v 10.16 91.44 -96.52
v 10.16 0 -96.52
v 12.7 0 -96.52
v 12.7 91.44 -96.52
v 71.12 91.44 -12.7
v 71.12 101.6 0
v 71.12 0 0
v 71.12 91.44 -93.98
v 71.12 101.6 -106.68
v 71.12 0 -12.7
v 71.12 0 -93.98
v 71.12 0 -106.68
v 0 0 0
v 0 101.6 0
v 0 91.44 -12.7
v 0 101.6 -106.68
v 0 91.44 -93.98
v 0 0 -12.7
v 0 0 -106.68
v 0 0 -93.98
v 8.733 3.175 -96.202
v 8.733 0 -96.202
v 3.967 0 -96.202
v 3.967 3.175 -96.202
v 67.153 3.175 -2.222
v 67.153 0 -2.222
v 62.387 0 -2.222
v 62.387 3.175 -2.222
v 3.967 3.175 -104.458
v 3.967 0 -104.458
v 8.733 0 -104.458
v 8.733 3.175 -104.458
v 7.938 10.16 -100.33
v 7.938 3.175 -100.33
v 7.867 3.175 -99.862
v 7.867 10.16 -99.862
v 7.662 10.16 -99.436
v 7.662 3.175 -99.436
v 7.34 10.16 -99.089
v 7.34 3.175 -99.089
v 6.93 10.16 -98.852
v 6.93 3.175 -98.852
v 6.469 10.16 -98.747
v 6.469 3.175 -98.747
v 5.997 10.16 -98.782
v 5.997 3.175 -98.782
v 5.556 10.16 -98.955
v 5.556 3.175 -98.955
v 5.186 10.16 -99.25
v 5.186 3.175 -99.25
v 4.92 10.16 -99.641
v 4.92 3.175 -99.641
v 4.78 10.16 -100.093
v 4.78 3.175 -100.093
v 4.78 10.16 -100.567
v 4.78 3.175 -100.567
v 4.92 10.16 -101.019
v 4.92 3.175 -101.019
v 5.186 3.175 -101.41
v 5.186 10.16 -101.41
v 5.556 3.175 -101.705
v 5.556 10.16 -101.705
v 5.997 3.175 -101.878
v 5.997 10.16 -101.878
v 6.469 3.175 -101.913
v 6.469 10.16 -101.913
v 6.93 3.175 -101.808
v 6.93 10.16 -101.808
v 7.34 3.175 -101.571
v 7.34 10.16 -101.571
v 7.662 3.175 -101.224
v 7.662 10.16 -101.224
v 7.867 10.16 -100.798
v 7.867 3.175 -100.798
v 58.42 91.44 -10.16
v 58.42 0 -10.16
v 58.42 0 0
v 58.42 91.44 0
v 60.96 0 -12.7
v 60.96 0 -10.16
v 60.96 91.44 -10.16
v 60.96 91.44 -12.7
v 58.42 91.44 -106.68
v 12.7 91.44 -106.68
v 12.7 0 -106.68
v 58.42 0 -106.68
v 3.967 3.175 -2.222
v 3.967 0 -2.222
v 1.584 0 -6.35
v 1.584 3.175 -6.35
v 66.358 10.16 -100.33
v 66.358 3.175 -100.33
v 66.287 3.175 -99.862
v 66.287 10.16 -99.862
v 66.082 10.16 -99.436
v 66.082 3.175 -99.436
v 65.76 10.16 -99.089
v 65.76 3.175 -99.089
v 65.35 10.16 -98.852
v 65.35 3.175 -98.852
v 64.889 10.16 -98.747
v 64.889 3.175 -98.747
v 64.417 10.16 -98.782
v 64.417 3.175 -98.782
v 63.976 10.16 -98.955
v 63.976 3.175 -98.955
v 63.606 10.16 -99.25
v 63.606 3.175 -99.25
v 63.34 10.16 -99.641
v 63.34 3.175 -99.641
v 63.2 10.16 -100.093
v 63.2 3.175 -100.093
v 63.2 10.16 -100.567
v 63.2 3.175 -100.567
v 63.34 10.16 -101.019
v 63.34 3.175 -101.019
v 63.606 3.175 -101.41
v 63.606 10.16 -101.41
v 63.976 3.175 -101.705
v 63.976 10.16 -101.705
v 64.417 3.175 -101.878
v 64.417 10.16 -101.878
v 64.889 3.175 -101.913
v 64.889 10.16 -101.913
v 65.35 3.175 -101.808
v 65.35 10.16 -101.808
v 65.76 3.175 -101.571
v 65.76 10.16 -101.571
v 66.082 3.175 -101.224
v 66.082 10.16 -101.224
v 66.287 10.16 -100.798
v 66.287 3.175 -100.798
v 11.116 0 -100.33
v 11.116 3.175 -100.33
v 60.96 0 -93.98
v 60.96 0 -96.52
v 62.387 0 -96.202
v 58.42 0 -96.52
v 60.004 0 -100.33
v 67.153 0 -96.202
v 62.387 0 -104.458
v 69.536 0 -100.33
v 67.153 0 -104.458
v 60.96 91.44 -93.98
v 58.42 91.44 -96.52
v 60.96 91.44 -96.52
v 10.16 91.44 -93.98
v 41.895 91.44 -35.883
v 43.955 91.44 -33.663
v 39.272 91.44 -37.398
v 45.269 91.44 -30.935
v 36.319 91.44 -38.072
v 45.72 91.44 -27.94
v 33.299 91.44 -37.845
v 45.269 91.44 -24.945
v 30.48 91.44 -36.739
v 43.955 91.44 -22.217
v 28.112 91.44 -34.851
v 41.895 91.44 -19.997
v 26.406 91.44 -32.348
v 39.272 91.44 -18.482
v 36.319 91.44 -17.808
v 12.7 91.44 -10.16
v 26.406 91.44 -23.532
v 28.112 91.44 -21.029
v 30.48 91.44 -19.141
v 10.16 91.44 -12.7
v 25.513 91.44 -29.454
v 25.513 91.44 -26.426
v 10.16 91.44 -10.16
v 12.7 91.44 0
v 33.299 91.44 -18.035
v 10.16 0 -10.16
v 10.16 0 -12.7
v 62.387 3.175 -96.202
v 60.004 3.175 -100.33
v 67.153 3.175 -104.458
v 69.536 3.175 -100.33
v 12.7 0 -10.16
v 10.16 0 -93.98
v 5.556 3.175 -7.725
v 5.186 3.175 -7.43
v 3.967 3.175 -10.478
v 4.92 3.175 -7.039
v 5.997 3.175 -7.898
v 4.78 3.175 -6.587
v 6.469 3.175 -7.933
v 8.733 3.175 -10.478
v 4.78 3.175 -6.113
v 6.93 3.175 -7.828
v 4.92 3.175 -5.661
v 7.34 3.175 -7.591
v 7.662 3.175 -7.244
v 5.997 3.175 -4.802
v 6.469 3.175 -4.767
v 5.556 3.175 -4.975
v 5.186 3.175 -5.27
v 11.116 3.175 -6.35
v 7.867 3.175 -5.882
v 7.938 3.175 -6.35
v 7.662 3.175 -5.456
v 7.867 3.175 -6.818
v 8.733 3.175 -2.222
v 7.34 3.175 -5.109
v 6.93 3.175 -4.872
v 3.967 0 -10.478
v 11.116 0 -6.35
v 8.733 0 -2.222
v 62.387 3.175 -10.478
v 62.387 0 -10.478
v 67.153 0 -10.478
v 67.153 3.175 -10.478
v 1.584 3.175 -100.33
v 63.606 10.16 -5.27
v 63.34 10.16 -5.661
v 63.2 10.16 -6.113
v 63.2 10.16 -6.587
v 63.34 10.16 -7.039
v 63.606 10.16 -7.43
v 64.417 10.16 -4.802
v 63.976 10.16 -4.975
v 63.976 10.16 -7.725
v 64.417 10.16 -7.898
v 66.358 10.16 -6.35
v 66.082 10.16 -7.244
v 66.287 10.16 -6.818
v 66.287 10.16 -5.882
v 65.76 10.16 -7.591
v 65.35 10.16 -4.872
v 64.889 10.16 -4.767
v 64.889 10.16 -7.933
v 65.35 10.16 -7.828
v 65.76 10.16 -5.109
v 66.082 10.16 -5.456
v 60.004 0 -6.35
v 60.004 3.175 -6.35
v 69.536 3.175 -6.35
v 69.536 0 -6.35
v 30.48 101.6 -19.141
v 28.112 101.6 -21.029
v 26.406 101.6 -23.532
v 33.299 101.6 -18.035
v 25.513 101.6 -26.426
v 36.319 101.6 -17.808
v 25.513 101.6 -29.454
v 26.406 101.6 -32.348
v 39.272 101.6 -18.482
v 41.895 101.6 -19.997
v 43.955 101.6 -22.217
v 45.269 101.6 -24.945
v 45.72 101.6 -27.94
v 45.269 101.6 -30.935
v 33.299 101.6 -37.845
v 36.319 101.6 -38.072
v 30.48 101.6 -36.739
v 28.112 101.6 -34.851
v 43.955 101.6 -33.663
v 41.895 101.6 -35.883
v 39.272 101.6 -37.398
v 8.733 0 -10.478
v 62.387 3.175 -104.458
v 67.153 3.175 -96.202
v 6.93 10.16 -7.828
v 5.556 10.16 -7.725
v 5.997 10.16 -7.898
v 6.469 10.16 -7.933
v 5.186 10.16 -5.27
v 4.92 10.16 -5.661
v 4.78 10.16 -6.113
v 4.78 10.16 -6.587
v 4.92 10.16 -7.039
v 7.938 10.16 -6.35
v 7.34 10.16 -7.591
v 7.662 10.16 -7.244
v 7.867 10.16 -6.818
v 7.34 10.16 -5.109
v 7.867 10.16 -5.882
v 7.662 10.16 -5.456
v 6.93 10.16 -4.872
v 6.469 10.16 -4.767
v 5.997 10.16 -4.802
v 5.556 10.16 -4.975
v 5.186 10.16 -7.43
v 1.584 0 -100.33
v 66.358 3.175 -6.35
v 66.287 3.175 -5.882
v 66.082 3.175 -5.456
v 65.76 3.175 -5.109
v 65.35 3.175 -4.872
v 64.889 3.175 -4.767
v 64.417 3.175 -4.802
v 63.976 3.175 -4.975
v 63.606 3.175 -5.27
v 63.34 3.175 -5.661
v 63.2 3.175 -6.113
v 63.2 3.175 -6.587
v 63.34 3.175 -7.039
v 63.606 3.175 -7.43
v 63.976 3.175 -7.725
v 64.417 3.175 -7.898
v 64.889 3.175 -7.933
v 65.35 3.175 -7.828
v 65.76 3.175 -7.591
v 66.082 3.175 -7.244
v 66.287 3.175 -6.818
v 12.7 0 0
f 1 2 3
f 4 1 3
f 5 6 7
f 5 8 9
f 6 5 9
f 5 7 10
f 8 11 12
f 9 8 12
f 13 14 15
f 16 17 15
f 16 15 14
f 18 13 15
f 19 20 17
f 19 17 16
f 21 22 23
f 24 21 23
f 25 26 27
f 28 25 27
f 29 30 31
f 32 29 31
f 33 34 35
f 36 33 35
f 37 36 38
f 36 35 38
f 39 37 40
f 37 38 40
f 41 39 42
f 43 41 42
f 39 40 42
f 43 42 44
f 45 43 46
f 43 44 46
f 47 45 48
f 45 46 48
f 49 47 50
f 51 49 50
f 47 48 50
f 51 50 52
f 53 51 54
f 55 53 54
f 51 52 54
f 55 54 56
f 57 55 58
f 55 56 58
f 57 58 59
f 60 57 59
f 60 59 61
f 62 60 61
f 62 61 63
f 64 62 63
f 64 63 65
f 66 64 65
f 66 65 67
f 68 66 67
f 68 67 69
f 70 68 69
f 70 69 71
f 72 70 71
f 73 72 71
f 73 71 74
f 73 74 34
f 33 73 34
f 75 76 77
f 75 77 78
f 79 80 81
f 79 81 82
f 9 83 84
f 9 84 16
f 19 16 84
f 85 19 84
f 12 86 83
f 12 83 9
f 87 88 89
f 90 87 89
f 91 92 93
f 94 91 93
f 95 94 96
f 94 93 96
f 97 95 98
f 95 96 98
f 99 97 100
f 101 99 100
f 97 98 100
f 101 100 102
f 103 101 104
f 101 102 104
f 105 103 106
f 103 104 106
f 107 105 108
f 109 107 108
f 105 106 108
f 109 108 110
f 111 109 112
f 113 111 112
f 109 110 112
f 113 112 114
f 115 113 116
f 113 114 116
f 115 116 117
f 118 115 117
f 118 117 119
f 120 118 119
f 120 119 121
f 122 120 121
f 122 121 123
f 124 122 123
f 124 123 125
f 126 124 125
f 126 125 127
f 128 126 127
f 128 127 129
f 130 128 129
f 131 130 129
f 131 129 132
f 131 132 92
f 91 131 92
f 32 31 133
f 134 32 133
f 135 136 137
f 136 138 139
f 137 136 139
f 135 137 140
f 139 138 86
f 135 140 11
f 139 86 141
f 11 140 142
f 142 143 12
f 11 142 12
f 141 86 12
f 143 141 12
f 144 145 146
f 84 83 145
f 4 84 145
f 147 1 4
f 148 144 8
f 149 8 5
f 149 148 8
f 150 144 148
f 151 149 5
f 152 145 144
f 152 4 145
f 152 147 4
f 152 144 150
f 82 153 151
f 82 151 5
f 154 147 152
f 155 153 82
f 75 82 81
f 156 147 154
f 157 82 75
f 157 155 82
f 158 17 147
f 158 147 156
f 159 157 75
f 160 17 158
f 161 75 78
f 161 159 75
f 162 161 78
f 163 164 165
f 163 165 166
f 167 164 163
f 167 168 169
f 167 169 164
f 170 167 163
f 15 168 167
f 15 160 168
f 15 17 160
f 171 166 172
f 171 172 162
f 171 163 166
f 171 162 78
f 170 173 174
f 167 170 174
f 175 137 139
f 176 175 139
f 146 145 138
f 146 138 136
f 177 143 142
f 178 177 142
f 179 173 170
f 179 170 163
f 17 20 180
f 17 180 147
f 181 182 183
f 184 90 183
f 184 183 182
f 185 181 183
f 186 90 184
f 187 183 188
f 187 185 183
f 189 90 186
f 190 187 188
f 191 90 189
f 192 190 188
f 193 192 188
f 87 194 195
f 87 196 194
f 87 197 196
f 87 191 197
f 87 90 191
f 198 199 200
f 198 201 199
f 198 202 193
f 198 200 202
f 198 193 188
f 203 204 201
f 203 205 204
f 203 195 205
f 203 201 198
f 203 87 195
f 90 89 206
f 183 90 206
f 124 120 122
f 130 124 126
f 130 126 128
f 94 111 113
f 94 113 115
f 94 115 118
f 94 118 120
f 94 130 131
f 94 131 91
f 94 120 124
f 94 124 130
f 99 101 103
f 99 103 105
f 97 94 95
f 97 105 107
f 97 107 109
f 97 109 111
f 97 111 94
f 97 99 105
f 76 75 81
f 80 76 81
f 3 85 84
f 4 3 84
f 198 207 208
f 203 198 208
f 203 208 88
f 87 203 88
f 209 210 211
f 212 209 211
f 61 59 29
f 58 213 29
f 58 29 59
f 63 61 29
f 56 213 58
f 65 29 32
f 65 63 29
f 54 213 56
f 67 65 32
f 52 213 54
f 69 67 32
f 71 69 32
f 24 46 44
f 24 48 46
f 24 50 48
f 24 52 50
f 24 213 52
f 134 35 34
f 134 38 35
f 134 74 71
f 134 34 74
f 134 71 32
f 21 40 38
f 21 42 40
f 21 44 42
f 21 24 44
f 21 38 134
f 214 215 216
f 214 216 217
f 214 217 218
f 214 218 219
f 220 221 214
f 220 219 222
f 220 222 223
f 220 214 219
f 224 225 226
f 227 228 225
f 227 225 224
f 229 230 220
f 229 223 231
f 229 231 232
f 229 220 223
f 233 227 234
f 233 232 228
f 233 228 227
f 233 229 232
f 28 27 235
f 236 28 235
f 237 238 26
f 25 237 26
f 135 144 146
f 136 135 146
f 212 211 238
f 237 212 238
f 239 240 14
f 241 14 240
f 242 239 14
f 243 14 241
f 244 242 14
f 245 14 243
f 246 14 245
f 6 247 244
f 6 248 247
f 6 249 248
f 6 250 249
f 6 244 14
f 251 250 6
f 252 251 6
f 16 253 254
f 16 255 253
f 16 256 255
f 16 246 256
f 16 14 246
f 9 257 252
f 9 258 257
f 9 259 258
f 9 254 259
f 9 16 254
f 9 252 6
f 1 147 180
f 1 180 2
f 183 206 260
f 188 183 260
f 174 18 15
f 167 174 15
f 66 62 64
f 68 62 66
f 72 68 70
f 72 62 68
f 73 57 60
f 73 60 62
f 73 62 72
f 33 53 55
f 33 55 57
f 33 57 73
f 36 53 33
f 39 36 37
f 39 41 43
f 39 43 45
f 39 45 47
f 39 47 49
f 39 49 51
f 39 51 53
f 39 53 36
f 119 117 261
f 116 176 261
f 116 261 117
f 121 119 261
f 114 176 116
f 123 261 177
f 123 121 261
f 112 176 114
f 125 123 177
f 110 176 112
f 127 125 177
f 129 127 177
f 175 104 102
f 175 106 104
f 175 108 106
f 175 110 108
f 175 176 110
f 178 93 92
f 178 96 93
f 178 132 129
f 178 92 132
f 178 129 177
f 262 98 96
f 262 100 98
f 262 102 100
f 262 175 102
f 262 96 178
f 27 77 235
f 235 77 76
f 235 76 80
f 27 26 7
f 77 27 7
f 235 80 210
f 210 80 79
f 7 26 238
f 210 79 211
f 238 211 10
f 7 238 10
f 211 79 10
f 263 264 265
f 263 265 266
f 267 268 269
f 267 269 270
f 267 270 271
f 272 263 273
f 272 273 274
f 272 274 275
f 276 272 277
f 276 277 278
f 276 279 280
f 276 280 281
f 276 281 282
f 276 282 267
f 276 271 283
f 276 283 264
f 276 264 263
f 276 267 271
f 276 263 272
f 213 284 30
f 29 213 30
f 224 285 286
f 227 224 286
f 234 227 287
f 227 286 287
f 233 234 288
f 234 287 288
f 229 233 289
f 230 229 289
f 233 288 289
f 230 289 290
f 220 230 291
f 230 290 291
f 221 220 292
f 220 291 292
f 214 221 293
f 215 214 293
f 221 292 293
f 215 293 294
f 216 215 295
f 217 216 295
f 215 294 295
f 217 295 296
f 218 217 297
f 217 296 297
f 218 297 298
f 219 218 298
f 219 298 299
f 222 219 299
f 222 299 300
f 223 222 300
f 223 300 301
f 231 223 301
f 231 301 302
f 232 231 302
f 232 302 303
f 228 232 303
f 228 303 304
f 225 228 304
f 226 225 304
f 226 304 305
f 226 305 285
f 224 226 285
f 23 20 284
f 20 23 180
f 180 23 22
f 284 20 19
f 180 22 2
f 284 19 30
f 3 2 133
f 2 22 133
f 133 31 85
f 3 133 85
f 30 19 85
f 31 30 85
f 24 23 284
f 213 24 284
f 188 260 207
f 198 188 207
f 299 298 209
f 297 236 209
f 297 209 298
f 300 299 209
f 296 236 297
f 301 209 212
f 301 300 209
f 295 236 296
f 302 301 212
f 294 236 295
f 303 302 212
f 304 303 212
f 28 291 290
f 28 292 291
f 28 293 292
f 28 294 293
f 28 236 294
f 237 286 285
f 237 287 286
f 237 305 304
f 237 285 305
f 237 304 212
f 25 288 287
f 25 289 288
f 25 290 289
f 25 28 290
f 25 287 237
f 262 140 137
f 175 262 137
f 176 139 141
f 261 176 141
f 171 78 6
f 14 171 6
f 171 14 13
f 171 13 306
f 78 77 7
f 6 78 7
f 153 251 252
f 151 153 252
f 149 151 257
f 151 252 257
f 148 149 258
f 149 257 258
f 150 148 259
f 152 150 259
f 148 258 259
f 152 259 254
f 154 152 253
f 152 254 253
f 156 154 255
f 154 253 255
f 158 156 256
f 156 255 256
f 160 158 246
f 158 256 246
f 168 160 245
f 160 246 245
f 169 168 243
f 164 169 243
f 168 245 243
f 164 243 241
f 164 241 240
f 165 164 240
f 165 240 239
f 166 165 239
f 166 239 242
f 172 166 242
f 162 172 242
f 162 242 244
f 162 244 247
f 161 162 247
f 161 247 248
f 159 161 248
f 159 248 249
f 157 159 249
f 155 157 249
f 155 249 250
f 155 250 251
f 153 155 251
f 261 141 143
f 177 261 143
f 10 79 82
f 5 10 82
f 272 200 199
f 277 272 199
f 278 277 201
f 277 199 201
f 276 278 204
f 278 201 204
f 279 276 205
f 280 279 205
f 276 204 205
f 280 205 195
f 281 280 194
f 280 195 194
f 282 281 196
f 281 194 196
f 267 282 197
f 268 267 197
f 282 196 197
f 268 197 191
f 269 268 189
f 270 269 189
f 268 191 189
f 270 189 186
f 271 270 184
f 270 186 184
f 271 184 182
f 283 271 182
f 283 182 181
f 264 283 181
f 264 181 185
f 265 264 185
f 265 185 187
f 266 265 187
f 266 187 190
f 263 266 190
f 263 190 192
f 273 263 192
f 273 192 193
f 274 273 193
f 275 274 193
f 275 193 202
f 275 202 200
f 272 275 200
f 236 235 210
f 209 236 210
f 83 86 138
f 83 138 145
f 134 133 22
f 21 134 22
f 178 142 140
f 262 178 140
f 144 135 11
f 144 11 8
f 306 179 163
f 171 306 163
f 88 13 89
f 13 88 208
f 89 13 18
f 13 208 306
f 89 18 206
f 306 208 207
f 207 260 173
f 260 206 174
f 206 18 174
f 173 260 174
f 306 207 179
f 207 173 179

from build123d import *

# Parameters (mm, degrees)
SKETCH1_W               = 71.12
SKETCH1_H               = 106.68
BOSS_EXTRUDE1_DEPTH     = 101.6
SHELL1_T                = -10.16
SKETCH3_R               = 1.5875
CUT_EXTRUDE1_DEPTH      = 10.16
SKETCH4_W               = 81.28
SKETCH4_H               = 91.44
CUT_EXTRUDE2_DEPTH      = 72.12
CUT_EXTRUDE3_DEPTH      = 3.175
SKETCH7_W               = 45.72
SKETCH7_H               = 91.44
CUT_EXTRUDE4_DEPTH      = 1
CUT_EXTRUDE4_DEPTH_BACK = 107.68
CUT_EXTRUDE5_REACH      = 103.6
SKETCH8_R               = 10.16


with BuildPart() as part:
    # Sketch1 → Boss-Extrude1 (new body)
    with BuildSketch(Plane(origin=(0, 0, 0), x_dir=(1, 0, 0), z_dir=(0, 1, 0))):
        with Locations((35.56, 53.34)):
            Rectangle(SKETCH1_W, SKETCH1_H)
    extrude(amount=BOSS_EXTRUDE1_DEPTH)

    # Shell1
    shell1_openings = [part.faces().sort_by_distance(p)[0] for p in [
        (35.56, 0, -53.34),
    ]]
    offset(amount=SHELL1_T, openings=shell1_openings, kind=Kind.INTERSECTION)

    # Sketch3 → Cut-Extrude1 (cut)
    with BuildSketch(Plane.XZ):
        with Locations((6.35, -6.35)):
            Circle(SKETCH3_R)
        with Locations((64.77, -6.35)):
            Circle(SKETCH3_R)
        with Locations((64.77, -100.33)):
            Circle(SKETCH3_R)
        with Locations((6.35, -100.33)):
            Circle(SKETCH3_R)
    extrude(amount=-CUT_EXTRUDE1_DEPTH, mode=Mode.SUBTRACT)

    # Sketch4 → Cut-Extrude2 (cut, through all)
    with BuildSketch(Plane.ZY):
        with Locations((-53.34, 45.72)):
            Rectangle(SKETCH4_W, SKETCH4_H)
    extrude(amount=-CUT_EXTRUDE2_DEPTH, mode=Mode.SUBTRACT)

    # Sketch6 → Cut-Extrude3 (cut)
    with BuildSketch(Plane.XZ):
        Polygon((69.536026472, -6.35), (67.153013236, -2.2225), (62.386986764, -2.2225), (60.003973528, -6.35), (62.386986764, -10.4775), (67.153013236, -10.4775), align=None)
        Polygon((11.116026472, -6.35), (8.733013236, -2.2225), (3.966986764, -2.2225), (1.583973528, -6.35), (3.966986764, -10.4775), (8.733013236, -10.4775), align=None)
        Polygon((69.536026472, -100.33), (67.153013236, -96.2025), (62.386986764, -96.2025), (60.003973528, -100.33), (62.386986764, -104.4575), (67.153013236, -104.4575), align=None)
        Polygon((11.116026472, -100.33), (8.733013236, -96.2025), (3.966986764, -96.2025), (1.583973528, -100.33), (3.966986764, -104.4575), (8.733013236, -104.4575), align=None)
    extrude(amount=-CUT_EXTRUDE3_DEPTH, mode=Mode.SUBTRACT)

    # Sketch7 → Cut-Extrude4 (cut, two sides)
    with BuildSketch(Plane(origin=(0, 0, -106.68), x_dir=(-1, 0, 0), z_dir=(0, 0, -1))) as cut_extrude4_sk:
        with Locations((-35.56, 45.72)):
            Rectangle(SKETCH7_W, SKETCH7_H)
    extrude(amount=CUT_EXTRUDE4_DEPTH, mode=Mode.SUBTRACT)
    extrude(cut_extrude4_sk.sketch, amount=-CUT_EXTRUDE4_DEPTH_BACK, mode=Mode.SUBTRACT)

    # Sketch8 → Cut-Extrude5 (cut, up to next)
    with BuildSketch(Plane(origin=(0, 101.6, 0), x_dir=(1, 0, 0), z_dir=(0, 1, 0)), mode=Mode.PRIVATE) as cut_extrude5_sk1:
        with Locations((35.56, 27.94)):
            Circle(SKETCH8_R)
    cut_extrude5_tool1 = extrude(cut_extrude5_sk1.sketch, amount=-CUT_EXTRUDE5_REACH, mode=Mode.PRIVATE) & part.part
    add(cut_extrude5_tool1.solids().sort_by_distance((35.56, 101.6, -27.94))[0], mode=Mode.SUBTRACT)


solid = part.part
